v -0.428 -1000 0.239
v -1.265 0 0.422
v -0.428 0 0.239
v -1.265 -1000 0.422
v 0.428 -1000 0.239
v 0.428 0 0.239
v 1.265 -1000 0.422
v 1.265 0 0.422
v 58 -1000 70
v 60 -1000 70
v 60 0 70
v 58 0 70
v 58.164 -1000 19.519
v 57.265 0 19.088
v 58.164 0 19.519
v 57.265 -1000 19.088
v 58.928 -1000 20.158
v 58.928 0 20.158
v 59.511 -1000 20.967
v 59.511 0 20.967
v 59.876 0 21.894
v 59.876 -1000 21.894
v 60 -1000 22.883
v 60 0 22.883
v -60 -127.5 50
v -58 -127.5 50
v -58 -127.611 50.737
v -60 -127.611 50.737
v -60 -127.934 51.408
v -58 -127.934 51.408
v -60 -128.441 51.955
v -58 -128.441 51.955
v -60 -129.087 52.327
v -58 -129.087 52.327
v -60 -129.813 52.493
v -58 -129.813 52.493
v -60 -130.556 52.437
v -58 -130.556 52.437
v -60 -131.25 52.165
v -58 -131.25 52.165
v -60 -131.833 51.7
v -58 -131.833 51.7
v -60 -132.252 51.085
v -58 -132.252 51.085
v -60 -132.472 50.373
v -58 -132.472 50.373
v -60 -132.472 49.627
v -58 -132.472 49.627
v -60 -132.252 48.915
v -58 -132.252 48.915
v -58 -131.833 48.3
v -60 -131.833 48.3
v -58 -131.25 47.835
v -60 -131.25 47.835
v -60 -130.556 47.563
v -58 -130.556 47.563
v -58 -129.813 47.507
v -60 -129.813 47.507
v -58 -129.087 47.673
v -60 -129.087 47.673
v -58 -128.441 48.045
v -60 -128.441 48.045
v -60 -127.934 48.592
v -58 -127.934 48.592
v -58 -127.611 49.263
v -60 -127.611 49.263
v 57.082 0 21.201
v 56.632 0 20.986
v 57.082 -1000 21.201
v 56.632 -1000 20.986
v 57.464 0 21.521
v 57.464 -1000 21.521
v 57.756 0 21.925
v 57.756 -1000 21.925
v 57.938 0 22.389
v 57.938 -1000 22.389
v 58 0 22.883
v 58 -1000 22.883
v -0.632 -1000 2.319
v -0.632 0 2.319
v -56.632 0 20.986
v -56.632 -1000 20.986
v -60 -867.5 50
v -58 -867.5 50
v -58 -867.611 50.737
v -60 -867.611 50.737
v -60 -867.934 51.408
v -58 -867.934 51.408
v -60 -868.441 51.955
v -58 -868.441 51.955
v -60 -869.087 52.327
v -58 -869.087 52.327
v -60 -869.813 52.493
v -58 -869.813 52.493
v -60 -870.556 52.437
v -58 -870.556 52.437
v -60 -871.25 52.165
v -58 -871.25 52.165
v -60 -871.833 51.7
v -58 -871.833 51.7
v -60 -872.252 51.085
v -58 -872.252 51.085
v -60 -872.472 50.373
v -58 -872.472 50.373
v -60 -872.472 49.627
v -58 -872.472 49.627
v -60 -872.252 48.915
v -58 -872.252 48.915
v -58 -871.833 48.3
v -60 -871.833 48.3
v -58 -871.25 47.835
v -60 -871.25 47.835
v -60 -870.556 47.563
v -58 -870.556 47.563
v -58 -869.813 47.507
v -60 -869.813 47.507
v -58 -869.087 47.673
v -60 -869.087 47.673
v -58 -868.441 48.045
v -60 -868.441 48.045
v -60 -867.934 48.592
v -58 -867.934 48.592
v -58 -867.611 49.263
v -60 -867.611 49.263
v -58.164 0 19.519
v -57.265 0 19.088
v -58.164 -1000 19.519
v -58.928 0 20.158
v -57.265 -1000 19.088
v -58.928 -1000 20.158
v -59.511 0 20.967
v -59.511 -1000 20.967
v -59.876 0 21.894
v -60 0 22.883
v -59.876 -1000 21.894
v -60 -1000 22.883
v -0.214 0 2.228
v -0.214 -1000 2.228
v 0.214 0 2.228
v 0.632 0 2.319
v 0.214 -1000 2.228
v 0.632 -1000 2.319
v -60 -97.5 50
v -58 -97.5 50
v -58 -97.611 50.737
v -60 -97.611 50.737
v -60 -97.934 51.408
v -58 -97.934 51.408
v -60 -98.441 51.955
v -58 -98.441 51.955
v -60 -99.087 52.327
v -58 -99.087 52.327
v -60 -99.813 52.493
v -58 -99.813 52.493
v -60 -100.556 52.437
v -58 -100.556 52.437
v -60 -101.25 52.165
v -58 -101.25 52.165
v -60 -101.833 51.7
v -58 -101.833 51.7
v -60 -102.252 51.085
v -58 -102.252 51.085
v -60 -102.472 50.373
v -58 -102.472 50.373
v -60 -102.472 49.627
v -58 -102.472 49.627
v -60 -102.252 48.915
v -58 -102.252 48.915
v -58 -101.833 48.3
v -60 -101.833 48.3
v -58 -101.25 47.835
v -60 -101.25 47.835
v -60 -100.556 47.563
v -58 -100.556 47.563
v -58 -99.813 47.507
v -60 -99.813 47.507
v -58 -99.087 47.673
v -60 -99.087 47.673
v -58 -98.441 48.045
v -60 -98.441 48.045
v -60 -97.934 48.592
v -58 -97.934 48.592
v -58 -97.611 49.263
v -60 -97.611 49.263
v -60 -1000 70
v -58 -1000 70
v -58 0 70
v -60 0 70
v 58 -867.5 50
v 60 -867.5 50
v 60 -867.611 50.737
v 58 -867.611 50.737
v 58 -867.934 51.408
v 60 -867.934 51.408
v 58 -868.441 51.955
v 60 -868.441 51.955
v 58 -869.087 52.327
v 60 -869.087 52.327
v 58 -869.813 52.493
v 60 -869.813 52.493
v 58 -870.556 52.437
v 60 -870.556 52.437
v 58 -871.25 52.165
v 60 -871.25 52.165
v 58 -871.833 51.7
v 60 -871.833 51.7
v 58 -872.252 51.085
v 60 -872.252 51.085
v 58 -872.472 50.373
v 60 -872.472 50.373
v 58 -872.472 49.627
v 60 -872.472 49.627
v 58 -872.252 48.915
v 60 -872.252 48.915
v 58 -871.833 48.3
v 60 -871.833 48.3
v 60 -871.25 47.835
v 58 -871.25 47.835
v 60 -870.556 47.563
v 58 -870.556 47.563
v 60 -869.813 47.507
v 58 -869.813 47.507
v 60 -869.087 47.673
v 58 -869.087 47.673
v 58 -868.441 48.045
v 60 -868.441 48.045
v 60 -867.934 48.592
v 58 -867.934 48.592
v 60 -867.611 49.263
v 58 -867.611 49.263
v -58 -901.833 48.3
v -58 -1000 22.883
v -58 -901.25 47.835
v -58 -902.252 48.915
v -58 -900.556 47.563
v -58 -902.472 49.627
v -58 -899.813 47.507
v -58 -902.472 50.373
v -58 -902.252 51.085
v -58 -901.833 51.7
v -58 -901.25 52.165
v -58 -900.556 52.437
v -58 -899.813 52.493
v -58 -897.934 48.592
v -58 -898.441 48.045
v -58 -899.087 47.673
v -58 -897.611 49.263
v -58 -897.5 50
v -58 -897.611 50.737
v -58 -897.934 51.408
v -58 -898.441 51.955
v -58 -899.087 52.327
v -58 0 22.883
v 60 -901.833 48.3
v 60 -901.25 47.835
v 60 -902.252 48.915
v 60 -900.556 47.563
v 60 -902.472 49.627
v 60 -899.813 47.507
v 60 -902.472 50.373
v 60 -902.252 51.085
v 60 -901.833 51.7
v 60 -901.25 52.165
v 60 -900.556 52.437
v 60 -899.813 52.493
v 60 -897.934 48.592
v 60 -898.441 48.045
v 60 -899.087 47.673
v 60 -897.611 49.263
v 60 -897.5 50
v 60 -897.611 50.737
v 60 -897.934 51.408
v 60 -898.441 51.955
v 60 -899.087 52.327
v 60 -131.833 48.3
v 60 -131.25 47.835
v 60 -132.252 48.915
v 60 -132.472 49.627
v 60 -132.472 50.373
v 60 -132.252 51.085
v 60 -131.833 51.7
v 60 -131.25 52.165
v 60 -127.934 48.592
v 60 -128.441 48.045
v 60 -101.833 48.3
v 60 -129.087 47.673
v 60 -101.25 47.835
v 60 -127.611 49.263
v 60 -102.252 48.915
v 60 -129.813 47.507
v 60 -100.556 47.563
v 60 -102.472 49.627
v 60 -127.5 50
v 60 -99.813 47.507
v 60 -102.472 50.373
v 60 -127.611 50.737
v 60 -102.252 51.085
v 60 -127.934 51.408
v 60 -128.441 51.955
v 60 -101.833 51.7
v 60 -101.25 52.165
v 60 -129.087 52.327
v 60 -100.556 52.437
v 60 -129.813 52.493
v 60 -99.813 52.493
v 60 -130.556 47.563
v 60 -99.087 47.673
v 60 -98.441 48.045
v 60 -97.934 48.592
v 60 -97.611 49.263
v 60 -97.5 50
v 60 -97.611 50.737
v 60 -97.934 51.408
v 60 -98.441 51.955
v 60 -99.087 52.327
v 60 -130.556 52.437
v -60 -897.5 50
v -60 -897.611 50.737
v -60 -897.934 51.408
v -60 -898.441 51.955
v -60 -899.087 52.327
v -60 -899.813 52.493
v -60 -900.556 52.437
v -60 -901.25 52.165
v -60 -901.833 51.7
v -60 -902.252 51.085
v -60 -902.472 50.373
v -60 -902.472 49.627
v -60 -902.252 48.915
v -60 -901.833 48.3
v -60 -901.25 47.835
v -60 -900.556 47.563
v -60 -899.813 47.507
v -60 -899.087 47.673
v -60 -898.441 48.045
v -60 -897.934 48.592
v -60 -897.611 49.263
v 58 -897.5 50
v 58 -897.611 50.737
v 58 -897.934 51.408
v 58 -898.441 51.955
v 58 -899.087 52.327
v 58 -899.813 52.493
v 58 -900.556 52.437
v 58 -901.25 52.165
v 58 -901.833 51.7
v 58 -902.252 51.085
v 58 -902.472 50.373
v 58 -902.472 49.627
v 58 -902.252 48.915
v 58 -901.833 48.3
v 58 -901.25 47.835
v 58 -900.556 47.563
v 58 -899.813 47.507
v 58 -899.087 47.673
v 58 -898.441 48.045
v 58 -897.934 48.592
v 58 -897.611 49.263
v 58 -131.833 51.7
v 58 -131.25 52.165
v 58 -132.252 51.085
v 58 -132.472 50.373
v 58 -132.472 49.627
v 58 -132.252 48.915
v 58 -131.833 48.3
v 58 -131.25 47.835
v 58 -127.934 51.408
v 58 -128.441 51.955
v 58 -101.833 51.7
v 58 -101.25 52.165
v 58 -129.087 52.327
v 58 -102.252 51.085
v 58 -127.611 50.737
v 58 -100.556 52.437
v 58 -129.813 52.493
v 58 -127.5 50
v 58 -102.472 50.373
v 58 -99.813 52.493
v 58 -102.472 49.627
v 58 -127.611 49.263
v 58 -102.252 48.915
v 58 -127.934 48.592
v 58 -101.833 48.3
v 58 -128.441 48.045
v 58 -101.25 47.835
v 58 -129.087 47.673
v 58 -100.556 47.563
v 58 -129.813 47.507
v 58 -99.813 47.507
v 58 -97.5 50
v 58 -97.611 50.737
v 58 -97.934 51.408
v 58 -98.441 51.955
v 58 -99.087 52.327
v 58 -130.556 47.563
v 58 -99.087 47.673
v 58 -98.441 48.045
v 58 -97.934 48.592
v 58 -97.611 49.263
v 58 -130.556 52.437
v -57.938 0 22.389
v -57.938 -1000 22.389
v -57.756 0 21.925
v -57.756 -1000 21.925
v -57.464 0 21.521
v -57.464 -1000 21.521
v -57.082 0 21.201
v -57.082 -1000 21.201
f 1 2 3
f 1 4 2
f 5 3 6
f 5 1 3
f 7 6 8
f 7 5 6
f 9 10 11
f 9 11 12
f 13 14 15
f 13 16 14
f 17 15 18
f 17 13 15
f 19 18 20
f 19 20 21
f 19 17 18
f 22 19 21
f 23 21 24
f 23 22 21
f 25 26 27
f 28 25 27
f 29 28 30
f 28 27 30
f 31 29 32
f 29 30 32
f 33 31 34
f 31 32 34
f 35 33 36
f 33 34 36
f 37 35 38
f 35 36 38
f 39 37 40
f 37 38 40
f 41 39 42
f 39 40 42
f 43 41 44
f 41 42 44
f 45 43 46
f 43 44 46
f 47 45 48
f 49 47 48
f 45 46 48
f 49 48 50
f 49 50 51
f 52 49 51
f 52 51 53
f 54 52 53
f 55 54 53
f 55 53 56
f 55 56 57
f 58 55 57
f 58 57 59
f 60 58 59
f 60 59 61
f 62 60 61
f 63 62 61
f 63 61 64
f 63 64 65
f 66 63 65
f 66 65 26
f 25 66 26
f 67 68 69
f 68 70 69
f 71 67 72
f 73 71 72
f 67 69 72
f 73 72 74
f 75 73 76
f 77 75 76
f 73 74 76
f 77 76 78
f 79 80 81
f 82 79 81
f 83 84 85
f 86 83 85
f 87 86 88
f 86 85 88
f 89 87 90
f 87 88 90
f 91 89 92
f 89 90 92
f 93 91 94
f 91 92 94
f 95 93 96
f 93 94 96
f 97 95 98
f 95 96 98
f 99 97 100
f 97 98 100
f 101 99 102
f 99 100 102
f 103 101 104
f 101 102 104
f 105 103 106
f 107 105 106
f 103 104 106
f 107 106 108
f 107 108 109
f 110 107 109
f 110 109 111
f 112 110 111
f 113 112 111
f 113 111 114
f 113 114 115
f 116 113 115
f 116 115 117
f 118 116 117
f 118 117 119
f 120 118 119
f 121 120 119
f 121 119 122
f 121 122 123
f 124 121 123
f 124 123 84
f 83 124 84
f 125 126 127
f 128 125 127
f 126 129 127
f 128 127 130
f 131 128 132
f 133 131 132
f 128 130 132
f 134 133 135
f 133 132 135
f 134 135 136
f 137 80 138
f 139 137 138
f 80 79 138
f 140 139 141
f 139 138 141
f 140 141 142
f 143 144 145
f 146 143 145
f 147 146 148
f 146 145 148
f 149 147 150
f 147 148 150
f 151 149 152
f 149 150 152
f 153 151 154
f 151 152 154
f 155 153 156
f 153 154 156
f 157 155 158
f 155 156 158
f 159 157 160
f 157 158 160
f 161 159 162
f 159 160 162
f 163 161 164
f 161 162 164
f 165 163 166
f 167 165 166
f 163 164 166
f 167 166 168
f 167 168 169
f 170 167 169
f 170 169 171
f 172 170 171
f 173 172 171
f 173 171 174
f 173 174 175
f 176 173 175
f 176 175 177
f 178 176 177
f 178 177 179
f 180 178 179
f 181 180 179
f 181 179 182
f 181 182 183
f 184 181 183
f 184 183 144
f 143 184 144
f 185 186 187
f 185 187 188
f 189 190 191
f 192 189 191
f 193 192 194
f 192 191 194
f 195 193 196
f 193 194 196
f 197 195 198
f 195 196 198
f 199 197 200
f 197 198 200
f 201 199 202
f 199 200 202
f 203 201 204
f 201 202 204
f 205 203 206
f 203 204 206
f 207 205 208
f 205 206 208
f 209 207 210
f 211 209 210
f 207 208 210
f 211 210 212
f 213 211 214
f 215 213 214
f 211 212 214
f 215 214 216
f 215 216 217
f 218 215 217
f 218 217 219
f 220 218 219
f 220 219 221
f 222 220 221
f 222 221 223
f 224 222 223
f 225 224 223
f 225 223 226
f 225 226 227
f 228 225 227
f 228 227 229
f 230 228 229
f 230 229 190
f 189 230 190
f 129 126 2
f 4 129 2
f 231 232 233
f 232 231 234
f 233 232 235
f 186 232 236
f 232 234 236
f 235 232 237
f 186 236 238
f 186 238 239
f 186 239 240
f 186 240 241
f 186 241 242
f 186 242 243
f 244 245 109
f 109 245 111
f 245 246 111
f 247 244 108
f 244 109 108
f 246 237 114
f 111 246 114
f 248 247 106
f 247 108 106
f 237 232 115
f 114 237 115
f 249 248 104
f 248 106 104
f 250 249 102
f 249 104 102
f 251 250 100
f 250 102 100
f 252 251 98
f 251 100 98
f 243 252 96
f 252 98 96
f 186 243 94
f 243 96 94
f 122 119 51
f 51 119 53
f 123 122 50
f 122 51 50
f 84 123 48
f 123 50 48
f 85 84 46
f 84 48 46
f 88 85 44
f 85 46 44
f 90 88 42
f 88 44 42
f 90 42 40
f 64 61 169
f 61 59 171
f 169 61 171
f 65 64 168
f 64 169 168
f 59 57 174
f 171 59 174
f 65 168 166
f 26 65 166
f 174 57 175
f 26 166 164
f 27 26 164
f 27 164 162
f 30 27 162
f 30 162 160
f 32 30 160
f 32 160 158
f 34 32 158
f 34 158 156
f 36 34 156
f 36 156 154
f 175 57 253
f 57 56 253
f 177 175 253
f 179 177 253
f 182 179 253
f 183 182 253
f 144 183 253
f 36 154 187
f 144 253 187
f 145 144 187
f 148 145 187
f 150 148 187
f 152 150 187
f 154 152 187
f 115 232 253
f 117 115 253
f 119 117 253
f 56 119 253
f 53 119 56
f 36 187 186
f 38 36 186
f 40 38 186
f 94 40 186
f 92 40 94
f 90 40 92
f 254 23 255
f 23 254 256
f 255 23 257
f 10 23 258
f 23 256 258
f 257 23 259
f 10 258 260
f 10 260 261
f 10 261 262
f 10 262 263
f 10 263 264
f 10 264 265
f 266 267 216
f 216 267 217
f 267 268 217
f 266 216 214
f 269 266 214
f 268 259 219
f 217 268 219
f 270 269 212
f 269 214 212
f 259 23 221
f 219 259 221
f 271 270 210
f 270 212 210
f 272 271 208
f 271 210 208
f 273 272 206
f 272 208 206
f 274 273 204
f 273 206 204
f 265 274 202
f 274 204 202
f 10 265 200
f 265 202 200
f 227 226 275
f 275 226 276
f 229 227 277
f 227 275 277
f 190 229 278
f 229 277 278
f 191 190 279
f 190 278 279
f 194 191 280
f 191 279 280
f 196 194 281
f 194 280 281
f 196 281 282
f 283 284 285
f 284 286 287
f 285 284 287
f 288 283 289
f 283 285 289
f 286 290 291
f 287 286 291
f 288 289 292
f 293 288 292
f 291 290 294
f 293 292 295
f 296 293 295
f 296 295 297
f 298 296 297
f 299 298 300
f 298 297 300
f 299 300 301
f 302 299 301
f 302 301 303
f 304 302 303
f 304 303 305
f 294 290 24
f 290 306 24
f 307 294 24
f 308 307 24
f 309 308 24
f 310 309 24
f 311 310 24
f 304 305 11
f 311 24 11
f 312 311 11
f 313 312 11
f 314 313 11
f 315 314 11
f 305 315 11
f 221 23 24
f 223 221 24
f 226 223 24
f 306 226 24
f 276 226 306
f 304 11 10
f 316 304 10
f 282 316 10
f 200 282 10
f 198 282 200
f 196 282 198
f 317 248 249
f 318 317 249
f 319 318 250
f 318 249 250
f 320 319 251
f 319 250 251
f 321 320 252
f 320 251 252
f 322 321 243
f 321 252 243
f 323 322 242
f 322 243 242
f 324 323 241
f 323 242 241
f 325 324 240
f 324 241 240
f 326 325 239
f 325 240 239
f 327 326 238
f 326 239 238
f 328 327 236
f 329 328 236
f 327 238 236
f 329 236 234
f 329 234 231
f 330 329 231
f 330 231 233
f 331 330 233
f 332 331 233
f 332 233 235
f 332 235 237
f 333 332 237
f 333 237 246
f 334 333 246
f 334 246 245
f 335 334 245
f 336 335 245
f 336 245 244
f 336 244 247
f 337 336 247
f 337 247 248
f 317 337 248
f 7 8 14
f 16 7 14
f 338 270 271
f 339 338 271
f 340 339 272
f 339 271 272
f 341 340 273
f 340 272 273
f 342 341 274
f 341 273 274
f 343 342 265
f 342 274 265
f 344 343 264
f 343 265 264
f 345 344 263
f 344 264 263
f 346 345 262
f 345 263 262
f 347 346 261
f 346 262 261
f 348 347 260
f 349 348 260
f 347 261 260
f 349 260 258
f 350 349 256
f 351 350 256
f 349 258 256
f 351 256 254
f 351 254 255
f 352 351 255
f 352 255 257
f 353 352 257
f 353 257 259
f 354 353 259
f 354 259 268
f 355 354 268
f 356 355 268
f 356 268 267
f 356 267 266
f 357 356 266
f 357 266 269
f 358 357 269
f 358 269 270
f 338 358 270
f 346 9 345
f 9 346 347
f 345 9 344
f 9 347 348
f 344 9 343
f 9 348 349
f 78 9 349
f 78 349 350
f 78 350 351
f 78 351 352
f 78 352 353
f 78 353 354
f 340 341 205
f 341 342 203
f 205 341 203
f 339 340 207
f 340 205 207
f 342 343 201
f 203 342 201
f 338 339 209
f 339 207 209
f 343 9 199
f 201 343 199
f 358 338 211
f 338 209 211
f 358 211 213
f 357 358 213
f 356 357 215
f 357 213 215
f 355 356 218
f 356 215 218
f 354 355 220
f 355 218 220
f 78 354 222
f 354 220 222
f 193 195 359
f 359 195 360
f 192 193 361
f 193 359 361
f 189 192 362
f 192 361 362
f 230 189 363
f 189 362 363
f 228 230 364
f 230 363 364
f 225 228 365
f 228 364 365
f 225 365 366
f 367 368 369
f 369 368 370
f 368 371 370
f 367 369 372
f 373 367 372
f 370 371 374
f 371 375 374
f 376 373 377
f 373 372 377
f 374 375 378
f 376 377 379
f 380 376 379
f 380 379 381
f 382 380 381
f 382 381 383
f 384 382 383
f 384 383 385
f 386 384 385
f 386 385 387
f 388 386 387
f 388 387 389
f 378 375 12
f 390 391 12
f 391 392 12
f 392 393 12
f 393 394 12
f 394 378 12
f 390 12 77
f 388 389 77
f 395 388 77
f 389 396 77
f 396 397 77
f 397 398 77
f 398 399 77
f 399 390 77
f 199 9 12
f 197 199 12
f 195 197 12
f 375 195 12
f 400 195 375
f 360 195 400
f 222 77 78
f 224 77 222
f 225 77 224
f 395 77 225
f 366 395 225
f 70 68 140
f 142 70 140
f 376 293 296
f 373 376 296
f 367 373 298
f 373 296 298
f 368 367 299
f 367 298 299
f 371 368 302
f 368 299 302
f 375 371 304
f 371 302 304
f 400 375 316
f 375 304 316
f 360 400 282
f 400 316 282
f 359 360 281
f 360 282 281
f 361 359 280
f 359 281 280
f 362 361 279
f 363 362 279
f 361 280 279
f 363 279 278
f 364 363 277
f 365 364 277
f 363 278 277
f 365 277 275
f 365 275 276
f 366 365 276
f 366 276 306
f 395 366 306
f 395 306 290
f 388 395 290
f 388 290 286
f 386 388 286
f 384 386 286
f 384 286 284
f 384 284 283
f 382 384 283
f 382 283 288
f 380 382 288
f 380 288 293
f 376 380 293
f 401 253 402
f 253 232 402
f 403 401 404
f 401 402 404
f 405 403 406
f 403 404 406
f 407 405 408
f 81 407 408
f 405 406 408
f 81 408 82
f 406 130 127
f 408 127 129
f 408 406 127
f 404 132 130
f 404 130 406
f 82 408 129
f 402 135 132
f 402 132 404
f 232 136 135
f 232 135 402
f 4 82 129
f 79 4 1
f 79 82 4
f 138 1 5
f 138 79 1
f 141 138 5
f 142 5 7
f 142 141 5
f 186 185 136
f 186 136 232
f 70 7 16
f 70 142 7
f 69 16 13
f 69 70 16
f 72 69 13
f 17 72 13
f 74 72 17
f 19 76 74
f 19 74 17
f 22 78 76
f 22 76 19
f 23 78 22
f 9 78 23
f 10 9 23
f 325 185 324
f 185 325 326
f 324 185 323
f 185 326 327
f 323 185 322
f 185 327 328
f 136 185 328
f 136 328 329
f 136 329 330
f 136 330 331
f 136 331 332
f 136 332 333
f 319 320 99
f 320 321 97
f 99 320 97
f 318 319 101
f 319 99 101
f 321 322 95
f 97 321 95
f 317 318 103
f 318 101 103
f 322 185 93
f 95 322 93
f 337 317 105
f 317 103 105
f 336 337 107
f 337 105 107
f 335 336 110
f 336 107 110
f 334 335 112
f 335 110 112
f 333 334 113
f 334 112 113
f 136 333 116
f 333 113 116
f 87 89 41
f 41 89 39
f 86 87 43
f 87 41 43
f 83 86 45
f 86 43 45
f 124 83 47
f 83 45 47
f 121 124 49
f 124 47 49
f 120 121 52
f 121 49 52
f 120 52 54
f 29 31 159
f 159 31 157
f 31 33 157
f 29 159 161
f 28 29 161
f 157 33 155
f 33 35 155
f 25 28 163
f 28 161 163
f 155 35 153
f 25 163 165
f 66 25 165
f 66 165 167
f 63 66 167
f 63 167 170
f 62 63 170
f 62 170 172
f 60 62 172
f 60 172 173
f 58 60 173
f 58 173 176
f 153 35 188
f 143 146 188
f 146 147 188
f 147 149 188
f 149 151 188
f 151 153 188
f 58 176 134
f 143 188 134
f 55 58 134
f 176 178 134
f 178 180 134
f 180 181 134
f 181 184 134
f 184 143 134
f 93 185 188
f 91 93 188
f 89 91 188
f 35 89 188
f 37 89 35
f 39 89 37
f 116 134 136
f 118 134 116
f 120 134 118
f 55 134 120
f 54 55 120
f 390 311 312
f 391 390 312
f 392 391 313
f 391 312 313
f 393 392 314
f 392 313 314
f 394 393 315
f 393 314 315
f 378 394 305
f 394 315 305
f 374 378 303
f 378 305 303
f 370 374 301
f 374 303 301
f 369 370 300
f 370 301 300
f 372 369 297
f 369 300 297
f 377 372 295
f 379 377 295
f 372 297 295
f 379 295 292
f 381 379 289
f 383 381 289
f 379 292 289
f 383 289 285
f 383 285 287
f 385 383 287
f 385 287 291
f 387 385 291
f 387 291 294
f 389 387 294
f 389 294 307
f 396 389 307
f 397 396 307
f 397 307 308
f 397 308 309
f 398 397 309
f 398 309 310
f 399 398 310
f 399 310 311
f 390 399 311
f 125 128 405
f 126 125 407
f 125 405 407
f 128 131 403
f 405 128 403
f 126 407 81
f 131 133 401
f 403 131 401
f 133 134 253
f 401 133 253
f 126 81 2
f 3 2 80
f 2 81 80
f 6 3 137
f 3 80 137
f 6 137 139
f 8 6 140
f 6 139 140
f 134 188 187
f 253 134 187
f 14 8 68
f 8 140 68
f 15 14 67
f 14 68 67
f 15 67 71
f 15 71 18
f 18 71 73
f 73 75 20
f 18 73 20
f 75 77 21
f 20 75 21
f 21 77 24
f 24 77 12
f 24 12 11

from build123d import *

# Parameters (mm, degrees)
F1_DEPTH = 1000
F2_R     = 4
F3_R     = 2
F5_D     = 5


with BuildPart() as f1:
    # F0 (on Front) → F1 (new body)
    with BuildSketch(Plane.XZ):
        Polygon((-60, 20), (0, 0), (60, 20), (60, 70), (58, 70), (58, 21.441518), (0, 2.108185), (-58, 21.441518), (-58, 70), (-60, 70), align=None)
    extrude(amount=F1_DEPTH)

    # F2
    f2_edges = [f1.edges().sort_by_distance(p)[0] for p in [
        (60, -500, 20),
        (0, -500, 0),
        (-60, -500, 20),
    ]]
    fillet(f2_edges, radius=F2_R)

    # F3
    f3_edges = [f1.edges().sort_by_distance(p)[0] for p in [
        (-58, -500, 21.441518),
        (0, -500, 2.108185),
        (58, -500, 21.441518),
    ]]
    fillet(f3_edges, radius=F3_R)

    # F5 (through all)
    with Locations(Plane(origin=(-60, 0, 0), x_dir=(0, -1, 0), z_dir=(-1, 0, 0))):
        with Locations((100, 50), (130, 50), (870, 50), (900, 50)):
            Hole(F5_D / 2)


solid = f1.part
